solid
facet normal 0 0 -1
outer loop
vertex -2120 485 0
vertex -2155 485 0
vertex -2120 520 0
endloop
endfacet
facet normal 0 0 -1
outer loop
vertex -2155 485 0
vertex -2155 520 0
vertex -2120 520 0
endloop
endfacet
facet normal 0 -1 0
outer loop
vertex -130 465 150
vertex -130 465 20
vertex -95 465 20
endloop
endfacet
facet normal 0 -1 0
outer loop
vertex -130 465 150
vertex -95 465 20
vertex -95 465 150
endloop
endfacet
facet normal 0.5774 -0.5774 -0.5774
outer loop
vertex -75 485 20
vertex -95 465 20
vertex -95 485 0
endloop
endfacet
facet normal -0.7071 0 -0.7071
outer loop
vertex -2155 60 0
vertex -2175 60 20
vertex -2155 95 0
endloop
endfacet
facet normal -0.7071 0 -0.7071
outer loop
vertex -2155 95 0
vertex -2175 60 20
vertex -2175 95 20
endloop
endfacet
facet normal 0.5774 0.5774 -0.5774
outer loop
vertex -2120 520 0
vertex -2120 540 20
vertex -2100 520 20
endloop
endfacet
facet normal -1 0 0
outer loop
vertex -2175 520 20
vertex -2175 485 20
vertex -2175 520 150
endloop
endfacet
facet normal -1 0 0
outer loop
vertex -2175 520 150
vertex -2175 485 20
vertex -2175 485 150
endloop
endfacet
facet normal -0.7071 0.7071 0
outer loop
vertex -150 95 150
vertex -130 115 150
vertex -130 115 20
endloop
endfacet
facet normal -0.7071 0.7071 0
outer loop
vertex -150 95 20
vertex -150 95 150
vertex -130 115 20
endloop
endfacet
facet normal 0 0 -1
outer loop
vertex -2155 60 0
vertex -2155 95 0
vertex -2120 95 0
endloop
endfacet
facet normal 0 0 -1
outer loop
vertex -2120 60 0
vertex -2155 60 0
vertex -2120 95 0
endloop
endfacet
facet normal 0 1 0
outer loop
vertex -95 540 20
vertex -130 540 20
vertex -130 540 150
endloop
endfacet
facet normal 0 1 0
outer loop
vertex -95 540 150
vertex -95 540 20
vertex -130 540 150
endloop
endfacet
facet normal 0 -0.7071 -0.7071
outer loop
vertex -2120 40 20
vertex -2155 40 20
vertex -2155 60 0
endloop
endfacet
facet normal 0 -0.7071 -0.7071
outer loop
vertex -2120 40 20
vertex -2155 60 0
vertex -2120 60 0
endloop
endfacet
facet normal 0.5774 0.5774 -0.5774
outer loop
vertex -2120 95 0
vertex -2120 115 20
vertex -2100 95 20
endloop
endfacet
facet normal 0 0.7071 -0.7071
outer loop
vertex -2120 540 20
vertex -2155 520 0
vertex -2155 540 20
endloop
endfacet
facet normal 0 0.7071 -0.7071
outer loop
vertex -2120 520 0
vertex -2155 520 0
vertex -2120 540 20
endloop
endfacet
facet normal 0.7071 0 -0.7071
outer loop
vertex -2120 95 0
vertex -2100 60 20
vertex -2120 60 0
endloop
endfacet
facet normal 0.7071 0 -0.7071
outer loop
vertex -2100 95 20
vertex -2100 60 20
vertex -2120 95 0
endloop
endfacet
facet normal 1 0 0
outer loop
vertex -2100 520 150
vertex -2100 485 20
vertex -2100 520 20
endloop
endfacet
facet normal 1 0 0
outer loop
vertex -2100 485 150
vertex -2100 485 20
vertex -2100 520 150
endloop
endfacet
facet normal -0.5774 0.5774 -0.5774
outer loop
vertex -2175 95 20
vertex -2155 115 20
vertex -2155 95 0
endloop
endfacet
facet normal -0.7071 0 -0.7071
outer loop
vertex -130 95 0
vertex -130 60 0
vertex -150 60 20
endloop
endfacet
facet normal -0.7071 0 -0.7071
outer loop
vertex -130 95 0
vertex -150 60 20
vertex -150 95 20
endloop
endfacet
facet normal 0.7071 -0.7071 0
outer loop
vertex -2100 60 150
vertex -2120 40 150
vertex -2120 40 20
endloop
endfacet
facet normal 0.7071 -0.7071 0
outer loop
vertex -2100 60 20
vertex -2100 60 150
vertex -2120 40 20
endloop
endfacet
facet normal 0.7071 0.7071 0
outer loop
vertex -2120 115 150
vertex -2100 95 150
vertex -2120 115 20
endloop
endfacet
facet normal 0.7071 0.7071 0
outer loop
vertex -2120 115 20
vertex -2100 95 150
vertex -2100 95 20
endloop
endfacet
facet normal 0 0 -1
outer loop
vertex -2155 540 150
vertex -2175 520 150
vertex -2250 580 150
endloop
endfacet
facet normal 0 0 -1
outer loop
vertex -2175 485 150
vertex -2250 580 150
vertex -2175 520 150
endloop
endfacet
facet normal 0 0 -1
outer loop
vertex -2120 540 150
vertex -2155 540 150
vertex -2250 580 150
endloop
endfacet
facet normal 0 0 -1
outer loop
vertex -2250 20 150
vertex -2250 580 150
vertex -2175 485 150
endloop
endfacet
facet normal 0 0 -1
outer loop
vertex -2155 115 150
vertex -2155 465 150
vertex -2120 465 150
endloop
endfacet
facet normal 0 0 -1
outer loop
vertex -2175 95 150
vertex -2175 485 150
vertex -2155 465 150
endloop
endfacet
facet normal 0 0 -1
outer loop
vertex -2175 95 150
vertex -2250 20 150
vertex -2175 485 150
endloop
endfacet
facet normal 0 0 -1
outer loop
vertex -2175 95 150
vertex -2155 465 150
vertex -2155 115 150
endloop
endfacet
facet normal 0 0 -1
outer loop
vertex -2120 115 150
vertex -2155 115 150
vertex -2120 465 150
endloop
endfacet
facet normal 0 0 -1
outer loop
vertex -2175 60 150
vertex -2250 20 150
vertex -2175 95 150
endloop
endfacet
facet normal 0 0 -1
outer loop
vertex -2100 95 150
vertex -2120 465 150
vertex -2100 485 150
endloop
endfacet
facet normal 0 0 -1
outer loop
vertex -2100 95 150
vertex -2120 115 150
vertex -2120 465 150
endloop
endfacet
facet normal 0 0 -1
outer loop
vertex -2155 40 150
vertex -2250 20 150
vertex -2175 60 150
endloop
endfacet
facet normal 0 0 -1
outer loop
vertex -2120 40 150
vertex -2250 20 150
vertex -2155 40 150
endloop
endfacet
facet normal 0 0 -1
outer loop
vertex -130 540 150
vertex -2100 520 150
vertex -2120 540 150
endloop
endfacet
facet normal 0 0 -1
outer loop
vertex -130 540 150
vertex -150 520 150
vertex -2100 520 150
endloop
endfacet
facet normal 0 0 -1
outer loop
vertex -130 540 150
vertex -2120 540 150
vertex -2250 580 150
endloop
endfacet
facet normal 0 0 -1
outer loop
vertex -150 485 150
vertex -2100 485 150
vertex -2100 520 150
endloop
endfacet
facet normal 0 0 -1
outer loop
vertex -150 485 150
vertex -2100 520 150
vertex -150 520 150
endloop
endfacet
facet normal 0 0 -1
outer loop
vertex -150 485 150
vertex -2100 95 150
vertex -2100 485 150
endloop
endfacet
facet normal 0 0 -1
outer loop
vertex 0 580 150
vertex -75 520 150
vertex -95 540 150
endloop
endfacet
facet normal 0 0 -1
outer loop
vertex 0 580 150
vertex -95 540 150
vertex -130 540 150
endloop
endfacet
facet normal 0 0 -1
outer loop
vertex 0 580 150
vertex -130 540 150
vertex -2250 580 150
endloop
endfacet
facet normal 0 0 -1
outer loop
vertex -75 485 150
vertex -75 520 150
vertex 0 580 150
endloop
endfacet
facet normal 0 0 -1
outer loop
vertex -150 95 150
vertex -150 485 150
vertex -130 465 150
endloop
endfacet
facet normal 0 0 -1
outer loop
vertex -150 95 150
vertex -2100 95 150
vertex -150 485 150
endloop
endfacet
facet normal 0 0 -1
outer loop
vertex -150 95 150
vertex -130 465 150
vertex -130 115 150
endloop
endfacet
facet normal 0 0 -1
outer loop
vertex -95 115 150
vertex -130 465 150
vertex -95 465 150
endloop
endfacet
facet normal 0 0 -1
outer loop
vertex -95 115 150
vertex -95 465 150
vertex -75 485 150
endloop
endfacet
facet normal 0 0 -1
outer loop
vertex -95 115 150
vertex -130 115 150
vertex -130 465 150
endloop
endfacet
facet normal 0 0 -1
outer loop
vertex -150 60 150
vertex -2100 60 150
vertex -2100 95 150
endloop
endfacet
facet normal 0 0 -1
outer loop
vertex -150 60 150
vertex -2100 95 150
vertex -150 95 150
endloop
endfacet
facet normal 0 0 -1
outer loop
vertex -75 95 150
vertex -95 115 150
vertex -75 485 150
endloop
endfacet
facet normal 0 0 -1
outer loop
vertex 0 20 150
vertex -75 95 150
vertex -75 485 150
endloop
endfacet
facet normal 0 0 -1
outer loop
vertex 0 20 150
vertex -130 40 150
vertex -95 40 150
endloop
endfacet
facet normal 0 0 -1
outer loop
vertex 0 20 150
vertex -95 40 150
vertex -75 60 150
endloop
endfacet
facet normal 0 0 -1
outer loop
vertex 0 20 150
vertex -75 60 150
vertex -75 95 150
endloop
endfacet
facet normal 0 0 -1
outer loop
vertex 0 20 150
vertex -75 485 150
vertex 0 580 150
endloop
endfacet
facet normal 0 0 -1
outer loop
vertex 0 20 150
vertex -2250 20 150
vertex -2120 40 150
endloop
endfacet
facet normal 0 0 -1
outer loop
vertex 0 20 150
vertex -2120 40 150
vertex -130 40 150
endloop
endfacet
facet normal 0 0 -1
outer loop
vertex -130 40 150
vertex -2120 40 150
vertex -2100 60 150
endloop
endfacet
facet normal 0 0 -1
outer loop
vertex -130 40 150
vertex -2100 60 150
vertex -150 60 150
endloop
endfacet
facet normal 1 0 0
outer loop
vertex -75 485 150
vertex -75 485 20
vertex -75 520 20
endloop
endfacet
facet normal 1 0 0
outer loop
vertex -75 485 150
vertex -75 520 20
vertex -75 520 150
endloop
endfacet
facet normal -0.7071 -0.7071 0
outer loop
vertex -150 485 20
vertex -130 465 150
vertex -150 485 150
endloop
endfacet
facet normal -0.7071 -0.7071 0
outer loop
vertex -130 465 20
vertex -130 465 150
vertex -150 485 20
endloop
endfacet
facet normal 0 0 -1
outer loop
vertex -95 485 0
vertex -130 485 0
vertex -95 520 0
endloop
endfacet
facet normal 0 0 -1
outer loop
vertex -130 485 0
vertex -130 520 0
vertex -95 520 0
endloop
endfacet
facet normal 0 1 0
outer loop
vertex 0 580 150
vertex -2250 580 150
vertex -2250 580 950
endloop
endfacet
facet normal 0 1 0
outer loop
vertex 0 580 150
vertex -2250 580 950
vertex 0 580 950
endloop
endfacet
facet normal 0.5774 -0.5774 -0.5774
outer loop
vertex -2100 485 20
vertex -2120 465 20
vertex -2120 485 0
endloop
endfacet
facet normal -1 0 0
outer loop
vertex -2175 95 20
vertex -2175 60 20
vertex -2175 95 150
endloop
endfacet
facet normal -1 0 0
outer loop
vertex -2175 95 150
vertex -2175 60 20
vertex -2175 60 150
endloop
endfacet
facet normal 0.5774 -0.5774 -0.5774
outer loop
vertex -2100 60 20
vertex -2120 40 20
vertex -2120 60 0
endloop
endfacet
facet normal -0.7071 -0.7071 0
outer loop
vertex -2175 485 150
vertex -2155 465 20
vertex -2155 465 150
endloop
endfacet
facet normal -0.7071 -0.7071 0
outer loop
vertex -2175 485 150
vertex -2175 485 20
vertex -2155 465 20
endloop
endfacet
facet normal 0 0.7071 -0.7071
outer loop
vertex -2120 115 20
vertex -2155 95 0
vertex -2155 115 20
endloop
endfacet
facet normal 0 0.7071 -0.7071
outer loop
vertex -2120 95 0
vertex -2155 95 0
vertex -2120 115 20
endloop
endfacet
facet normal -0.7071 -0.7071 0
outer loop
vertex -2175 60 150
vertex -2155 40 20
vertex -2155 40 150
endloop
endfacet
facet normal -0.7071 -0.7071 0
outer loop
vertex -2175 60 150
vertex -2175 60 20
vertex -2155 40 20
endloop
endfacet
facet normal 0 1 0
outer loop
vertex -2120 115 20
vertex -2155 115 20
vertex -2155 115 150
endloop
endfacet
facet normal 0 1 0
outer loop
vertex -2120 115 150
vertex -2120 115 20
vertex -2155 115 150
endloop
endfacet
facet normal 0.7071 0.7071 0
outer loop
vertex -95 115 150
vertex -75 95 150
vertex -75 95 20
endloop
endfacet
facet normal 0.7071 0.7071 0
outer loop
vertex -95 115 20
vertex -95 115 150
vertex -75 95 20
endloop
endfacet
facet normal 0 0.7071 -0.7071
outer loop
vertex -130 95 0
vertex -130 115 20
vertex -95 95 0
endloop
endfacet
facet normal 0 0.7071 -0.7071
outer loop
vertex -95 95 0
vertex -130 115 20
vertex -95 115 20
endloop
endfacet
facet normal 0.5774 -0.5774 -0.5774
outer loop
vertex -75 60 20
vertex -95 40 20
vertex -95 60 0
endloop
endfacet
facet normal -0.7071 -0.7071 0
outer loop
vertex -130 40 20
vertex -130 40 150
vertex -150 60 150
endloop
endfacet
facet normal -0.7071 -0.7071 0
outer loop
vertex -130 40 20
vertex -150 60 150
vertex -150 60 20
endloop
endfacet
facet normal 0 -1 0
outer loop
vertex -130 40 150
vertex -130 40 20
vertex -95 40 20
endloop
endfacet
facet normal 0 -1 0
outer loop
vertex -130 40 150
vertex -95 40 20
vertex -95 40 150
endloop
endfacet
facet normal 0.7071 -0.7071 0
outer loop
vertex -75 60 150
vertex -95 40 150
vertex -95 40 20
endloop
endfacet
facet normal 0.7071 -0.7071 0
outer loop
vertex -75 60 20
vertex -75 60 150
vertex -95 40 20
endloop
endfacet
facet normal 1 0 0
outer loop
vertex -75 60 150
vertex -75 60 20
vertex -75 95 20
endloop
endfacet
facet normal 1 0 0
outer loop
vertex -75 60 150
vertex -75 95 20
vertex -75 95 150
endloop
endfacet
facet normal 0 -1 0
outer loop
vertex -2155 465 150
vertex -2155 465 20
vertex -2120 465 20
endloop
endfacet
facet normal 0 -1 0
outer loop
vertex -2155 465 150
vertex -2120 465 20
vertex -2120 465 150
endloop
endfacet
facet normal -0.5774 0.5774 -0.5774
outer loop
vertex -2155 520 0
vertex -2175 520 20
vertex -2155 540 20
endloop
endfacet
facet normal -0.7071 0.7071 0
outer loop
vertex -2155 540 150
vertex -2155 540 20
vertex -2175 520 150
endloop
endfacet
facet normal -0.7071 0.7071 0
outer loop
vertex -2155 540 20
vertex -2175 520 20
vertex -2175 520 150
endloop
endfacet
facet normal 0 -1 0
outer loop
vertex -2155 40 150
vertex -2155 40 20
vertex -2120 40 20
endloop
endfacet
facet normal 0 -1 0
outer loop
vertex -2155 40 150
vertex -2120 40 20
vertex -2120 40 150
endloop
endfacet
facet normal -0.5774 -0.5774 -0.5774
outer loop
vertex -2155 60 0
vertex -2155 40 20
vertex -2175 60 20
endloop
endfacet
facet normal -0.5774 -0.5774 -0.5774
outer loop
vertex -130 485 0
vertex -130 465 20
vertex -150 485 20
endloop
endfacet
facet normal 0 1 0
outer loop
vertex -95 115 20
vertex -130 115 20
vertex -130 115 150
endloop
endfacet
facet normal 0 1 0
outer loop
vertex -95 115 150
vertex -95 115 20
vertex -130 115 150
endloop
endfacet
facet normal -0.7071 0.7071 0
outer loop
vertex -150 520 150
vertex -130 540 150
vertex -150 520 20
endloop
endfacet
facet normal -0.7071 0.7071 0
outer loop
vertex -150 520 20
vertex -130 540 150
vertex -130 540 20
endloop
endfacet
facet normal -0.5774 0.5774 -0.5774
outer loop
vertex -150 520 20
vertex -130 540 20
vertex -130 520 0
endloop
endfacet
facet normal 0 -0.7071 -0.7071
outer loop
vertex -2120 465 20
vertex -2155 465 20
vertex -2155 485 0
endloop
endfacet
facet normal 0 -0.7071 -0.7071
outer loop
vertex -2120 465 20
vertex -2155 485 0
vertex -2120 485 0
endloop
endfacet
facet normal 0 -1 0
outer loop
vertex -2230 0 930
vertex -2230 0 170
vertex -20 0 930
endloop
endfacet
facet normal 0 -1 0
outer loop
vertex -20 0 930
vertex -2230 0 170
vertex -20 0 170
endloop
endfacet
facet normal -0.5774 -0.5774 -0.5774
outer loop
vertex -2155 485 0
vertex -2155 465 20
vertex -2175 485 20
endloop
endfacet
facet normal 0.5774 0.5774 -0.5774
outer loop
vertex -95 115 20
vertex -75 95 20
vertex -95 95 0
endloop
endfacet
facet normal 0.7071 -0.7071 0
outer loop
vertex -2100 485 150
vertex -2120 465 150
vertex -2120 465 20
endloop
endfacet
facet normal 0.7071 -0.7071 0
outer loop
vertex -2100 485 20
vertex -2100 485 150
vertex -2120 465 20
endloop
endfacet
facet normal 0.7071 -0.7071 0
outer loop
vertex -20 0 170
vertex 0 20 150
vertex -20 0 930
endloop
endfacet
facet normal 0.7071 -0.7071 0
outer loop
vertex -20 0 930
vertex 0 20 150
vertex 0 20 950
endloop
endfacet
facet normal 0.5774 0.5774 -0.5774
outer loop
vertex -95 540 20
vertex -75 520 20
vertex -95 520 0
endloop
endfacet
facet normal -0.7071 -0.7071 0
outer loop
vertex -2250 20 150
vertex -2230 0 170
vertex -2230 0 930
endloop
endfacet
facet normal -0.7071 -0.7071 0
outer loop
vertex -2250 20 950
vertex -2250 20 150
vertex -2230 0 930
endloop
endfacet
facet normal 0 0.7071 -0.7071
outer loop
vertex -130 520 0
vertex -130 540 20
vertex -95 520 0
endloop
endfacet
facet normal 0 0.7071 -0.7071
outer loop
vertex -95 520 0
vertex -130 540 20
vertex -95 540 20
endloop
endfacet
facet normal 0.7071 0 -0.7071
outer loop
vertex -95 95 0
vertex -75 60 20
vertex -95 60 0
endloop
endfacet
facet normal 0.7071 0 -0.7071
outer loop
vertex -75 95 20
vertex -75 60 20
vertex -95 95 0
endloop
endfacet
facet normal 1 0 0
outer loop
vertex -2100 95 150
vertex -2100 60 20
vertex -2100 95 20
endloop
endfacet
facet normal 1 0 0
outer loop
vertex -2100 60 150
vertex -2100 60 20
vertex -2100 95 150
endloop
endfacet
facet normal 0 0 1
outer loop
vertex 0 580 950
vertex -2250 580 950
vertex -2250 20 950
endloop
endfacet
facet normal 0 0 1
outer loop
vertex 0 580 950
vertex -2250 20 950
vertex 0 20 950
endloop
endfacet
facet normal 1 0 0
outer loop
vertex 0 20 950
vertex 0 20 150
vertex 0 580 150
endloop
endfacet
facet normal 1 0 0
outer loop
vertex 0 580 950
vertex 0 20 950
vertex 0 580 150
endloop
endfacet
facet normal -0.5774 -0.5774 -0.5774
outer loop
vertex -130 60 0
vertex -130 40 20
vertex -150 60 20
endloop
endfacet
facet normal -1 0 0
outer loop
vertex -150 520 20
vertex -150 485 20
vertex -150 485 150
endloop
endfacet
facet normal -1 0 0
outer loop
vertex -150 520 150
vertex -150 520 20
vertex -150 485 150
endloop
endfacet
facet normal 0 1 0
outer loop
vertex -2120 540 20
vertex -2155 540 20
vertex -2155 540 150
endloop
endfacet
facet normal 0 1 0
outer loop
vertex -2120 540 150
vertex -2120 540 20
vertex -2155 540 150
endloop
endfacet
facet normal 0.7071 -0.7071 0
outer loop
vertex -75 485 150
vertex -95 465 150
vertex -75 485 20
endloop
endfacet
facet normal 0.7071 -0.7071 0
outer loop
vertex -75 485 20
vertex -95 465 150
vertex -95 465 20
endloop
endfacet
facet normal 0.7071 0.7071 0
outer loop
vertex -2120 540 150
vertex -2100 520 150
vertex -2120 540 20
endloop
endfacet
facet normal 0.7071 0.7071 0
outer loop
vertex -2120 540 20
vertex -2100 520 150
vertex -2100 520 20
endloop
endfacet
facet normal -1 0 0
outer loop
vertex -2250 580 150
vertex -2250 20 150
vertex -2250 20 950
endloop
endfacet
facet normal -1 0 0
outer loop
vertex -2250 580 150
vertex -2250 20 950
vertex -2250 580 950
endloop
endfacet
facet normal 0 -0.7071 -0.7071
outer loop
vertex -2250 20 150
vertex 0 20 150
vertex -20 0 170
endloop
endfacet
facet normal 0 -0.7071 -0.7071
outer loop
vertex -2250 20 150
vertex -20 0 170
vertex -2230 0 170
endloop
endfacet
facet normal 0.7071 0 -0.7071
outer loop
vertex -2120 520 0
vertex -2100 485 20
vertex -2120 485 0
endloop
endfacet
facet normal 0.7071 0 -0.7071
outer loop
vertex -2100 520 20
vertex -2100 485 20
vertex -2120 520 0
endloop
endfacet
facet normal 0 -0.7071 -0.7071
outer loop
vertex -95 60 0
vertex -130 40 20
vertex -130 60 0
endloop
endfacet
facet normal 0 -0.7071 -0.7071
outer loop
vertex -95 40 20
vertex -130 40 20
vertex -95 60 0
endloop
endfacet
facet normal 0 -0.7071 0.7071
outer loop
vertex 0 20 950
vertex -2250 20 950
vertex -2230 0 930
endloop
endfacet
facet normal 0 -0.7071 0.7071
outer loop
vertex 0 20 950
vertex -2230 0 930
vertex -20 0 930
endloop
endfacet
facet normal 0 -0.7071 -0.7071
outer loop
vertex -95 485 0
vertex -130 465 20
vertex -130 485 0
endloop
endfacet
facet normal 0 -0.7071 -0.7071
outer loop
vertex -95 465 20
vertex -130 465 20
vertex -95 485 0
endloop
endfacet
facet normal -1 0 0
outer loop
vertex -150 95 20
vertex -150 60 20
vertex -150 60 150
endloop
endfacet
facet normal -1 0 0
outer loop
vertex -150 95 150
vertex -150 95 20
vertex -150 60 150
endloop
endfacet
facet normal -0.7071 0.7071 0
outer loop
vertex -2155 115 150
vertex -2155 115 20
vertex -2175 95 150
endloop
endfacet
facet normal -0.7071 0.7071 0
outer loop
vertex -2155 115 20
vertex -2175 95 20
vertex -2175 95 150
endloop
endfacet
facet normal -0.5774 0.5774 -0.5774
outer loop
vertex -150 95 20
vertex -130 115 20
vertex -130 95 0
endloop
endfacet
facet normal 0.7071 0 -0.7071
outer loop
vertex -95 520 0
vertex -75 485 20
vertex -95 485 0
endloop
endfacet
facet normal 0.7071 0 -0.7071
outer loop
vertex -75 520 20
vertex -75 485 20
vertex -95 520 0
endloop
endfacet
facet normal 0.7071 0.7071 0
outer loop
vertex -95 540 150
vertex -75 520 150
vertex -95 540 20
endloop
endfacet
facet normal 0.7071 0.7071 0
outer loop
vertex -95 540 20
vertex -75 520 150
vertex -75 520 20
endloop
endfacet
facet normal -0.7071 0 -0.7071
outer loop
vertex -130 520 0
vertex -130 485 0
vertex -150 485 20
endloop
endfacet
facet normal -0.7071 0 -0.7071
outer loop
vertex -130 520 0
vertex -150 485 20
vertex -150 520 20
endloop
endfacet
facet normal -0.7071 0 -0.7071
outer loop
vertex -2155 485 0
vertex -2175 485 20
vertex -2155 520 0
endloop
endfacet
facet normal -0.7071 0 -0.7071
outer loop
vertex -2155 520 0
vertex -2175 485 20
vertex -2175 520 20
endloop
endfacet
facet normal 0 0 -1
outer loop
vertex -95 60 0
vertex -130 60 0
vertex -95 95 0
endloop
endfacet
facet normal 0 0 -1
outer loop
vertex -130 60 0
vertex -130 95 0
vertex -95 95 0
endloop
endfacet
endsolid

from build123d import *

# Parameters (mm, degrees)
F0_W     = 2250
F0_H     = 580
F1_DEPTH = 950
F2_W     = 1950
F2_H     = 150
F2_W_2   = 75
F3_DEPTH = 600
F4_W     = 40
F4_H     = 150
F4_W_2   = 350
F5_DEPTH = 2250
F6_SIZE  = 20


with BuildPart() as f1:
    # F0 (on Top) → F1 (new body)
    with BuildSketch(Plane.XY):
        with Locations((-1125, 290)):
            Rectangle(F0_W, F0_H)
    extrude(amount=F1_DEPTH)

    # F2 (on face) → F3 (cut)
    with BuildSketch(Plane.XZ):
        with Locations((-1125, 75)):
            Rectangle(F2_W, F2_H)
        with Locations((-2212.5, 75)):
            Rectangle(F2_W_2, F2_H)
        with Locations((-37.5, 75)):
            Rectangle(F2_W_2, F2_H)
    extrude(amount=-F3_DEPTH, mode=Mode.SUBTRACT)

    # F4 (on face) → F5 (cut)
    with BuildSketch(Plane(origin=(-2175, 0, 0), x_dir=(0, -1, 0), z_dir=(-1, 0, 0))):
        with Locations((-560, 75)):
            Rectangle(F4_W, F4_H)
        with Locations((-20, 75)):
            Rectangle(F4_W, F4_H)
        with Locations((-290, 75)):
            Rectangle(F4_W_2, F4_H)
    extrude(amount=-F5_DEPTH, mode=Mode.SUBTRACT)

    # F6
    f6_edges = [f1.edges().sort_by_distance(p)[0] for p in [
        (0, 0, 550),
        (-1125, 0, 150),
        (-2250, 0, 550),
        (-1125, 0, 950),
        (-2175, 40, 75),
        (-2100, 40, 75),
        (-2100, 115, 75),
        (-2175, 465, 75),
        (-2100, 465, 75),
        (-2100, 540, 75),
        (-2175, 540, 75),
        (-2175, 115, 75),
        (-75, 540, 75),
        (-75, 465, 75),
        (-75, 115, 75),
        (-75, 40, 75),
        (-150, 465, 75),
        (-150, 540, 75),
        (-150, 115, 75),
        (-150, 40, 75),
        (-112.5, 40, 0),
        (-75, 77.5, 0),
        (-112.5, 115, 0),
        (-150, 77.5, 0),
        (-112.5, 465, 0),
        (-75, 502.5, 0),
        (-112.5, 540, 0),
        (-150, 502.5, 0),
        (-2137.5, 465, 0),
        (-2175, 502.5, 0),
        (-2137.5, 540, 0),
        (-2100, 502.5, 0),
        (-2137.5, 115, 0),
        (-2137.5, 40, 0),
        (-2100, 77.5, 0),
        (-2175, 77.5, 0),
    ]]
    chamfer(f6_edges, length=F6_SIZE)


solid = f1.part
